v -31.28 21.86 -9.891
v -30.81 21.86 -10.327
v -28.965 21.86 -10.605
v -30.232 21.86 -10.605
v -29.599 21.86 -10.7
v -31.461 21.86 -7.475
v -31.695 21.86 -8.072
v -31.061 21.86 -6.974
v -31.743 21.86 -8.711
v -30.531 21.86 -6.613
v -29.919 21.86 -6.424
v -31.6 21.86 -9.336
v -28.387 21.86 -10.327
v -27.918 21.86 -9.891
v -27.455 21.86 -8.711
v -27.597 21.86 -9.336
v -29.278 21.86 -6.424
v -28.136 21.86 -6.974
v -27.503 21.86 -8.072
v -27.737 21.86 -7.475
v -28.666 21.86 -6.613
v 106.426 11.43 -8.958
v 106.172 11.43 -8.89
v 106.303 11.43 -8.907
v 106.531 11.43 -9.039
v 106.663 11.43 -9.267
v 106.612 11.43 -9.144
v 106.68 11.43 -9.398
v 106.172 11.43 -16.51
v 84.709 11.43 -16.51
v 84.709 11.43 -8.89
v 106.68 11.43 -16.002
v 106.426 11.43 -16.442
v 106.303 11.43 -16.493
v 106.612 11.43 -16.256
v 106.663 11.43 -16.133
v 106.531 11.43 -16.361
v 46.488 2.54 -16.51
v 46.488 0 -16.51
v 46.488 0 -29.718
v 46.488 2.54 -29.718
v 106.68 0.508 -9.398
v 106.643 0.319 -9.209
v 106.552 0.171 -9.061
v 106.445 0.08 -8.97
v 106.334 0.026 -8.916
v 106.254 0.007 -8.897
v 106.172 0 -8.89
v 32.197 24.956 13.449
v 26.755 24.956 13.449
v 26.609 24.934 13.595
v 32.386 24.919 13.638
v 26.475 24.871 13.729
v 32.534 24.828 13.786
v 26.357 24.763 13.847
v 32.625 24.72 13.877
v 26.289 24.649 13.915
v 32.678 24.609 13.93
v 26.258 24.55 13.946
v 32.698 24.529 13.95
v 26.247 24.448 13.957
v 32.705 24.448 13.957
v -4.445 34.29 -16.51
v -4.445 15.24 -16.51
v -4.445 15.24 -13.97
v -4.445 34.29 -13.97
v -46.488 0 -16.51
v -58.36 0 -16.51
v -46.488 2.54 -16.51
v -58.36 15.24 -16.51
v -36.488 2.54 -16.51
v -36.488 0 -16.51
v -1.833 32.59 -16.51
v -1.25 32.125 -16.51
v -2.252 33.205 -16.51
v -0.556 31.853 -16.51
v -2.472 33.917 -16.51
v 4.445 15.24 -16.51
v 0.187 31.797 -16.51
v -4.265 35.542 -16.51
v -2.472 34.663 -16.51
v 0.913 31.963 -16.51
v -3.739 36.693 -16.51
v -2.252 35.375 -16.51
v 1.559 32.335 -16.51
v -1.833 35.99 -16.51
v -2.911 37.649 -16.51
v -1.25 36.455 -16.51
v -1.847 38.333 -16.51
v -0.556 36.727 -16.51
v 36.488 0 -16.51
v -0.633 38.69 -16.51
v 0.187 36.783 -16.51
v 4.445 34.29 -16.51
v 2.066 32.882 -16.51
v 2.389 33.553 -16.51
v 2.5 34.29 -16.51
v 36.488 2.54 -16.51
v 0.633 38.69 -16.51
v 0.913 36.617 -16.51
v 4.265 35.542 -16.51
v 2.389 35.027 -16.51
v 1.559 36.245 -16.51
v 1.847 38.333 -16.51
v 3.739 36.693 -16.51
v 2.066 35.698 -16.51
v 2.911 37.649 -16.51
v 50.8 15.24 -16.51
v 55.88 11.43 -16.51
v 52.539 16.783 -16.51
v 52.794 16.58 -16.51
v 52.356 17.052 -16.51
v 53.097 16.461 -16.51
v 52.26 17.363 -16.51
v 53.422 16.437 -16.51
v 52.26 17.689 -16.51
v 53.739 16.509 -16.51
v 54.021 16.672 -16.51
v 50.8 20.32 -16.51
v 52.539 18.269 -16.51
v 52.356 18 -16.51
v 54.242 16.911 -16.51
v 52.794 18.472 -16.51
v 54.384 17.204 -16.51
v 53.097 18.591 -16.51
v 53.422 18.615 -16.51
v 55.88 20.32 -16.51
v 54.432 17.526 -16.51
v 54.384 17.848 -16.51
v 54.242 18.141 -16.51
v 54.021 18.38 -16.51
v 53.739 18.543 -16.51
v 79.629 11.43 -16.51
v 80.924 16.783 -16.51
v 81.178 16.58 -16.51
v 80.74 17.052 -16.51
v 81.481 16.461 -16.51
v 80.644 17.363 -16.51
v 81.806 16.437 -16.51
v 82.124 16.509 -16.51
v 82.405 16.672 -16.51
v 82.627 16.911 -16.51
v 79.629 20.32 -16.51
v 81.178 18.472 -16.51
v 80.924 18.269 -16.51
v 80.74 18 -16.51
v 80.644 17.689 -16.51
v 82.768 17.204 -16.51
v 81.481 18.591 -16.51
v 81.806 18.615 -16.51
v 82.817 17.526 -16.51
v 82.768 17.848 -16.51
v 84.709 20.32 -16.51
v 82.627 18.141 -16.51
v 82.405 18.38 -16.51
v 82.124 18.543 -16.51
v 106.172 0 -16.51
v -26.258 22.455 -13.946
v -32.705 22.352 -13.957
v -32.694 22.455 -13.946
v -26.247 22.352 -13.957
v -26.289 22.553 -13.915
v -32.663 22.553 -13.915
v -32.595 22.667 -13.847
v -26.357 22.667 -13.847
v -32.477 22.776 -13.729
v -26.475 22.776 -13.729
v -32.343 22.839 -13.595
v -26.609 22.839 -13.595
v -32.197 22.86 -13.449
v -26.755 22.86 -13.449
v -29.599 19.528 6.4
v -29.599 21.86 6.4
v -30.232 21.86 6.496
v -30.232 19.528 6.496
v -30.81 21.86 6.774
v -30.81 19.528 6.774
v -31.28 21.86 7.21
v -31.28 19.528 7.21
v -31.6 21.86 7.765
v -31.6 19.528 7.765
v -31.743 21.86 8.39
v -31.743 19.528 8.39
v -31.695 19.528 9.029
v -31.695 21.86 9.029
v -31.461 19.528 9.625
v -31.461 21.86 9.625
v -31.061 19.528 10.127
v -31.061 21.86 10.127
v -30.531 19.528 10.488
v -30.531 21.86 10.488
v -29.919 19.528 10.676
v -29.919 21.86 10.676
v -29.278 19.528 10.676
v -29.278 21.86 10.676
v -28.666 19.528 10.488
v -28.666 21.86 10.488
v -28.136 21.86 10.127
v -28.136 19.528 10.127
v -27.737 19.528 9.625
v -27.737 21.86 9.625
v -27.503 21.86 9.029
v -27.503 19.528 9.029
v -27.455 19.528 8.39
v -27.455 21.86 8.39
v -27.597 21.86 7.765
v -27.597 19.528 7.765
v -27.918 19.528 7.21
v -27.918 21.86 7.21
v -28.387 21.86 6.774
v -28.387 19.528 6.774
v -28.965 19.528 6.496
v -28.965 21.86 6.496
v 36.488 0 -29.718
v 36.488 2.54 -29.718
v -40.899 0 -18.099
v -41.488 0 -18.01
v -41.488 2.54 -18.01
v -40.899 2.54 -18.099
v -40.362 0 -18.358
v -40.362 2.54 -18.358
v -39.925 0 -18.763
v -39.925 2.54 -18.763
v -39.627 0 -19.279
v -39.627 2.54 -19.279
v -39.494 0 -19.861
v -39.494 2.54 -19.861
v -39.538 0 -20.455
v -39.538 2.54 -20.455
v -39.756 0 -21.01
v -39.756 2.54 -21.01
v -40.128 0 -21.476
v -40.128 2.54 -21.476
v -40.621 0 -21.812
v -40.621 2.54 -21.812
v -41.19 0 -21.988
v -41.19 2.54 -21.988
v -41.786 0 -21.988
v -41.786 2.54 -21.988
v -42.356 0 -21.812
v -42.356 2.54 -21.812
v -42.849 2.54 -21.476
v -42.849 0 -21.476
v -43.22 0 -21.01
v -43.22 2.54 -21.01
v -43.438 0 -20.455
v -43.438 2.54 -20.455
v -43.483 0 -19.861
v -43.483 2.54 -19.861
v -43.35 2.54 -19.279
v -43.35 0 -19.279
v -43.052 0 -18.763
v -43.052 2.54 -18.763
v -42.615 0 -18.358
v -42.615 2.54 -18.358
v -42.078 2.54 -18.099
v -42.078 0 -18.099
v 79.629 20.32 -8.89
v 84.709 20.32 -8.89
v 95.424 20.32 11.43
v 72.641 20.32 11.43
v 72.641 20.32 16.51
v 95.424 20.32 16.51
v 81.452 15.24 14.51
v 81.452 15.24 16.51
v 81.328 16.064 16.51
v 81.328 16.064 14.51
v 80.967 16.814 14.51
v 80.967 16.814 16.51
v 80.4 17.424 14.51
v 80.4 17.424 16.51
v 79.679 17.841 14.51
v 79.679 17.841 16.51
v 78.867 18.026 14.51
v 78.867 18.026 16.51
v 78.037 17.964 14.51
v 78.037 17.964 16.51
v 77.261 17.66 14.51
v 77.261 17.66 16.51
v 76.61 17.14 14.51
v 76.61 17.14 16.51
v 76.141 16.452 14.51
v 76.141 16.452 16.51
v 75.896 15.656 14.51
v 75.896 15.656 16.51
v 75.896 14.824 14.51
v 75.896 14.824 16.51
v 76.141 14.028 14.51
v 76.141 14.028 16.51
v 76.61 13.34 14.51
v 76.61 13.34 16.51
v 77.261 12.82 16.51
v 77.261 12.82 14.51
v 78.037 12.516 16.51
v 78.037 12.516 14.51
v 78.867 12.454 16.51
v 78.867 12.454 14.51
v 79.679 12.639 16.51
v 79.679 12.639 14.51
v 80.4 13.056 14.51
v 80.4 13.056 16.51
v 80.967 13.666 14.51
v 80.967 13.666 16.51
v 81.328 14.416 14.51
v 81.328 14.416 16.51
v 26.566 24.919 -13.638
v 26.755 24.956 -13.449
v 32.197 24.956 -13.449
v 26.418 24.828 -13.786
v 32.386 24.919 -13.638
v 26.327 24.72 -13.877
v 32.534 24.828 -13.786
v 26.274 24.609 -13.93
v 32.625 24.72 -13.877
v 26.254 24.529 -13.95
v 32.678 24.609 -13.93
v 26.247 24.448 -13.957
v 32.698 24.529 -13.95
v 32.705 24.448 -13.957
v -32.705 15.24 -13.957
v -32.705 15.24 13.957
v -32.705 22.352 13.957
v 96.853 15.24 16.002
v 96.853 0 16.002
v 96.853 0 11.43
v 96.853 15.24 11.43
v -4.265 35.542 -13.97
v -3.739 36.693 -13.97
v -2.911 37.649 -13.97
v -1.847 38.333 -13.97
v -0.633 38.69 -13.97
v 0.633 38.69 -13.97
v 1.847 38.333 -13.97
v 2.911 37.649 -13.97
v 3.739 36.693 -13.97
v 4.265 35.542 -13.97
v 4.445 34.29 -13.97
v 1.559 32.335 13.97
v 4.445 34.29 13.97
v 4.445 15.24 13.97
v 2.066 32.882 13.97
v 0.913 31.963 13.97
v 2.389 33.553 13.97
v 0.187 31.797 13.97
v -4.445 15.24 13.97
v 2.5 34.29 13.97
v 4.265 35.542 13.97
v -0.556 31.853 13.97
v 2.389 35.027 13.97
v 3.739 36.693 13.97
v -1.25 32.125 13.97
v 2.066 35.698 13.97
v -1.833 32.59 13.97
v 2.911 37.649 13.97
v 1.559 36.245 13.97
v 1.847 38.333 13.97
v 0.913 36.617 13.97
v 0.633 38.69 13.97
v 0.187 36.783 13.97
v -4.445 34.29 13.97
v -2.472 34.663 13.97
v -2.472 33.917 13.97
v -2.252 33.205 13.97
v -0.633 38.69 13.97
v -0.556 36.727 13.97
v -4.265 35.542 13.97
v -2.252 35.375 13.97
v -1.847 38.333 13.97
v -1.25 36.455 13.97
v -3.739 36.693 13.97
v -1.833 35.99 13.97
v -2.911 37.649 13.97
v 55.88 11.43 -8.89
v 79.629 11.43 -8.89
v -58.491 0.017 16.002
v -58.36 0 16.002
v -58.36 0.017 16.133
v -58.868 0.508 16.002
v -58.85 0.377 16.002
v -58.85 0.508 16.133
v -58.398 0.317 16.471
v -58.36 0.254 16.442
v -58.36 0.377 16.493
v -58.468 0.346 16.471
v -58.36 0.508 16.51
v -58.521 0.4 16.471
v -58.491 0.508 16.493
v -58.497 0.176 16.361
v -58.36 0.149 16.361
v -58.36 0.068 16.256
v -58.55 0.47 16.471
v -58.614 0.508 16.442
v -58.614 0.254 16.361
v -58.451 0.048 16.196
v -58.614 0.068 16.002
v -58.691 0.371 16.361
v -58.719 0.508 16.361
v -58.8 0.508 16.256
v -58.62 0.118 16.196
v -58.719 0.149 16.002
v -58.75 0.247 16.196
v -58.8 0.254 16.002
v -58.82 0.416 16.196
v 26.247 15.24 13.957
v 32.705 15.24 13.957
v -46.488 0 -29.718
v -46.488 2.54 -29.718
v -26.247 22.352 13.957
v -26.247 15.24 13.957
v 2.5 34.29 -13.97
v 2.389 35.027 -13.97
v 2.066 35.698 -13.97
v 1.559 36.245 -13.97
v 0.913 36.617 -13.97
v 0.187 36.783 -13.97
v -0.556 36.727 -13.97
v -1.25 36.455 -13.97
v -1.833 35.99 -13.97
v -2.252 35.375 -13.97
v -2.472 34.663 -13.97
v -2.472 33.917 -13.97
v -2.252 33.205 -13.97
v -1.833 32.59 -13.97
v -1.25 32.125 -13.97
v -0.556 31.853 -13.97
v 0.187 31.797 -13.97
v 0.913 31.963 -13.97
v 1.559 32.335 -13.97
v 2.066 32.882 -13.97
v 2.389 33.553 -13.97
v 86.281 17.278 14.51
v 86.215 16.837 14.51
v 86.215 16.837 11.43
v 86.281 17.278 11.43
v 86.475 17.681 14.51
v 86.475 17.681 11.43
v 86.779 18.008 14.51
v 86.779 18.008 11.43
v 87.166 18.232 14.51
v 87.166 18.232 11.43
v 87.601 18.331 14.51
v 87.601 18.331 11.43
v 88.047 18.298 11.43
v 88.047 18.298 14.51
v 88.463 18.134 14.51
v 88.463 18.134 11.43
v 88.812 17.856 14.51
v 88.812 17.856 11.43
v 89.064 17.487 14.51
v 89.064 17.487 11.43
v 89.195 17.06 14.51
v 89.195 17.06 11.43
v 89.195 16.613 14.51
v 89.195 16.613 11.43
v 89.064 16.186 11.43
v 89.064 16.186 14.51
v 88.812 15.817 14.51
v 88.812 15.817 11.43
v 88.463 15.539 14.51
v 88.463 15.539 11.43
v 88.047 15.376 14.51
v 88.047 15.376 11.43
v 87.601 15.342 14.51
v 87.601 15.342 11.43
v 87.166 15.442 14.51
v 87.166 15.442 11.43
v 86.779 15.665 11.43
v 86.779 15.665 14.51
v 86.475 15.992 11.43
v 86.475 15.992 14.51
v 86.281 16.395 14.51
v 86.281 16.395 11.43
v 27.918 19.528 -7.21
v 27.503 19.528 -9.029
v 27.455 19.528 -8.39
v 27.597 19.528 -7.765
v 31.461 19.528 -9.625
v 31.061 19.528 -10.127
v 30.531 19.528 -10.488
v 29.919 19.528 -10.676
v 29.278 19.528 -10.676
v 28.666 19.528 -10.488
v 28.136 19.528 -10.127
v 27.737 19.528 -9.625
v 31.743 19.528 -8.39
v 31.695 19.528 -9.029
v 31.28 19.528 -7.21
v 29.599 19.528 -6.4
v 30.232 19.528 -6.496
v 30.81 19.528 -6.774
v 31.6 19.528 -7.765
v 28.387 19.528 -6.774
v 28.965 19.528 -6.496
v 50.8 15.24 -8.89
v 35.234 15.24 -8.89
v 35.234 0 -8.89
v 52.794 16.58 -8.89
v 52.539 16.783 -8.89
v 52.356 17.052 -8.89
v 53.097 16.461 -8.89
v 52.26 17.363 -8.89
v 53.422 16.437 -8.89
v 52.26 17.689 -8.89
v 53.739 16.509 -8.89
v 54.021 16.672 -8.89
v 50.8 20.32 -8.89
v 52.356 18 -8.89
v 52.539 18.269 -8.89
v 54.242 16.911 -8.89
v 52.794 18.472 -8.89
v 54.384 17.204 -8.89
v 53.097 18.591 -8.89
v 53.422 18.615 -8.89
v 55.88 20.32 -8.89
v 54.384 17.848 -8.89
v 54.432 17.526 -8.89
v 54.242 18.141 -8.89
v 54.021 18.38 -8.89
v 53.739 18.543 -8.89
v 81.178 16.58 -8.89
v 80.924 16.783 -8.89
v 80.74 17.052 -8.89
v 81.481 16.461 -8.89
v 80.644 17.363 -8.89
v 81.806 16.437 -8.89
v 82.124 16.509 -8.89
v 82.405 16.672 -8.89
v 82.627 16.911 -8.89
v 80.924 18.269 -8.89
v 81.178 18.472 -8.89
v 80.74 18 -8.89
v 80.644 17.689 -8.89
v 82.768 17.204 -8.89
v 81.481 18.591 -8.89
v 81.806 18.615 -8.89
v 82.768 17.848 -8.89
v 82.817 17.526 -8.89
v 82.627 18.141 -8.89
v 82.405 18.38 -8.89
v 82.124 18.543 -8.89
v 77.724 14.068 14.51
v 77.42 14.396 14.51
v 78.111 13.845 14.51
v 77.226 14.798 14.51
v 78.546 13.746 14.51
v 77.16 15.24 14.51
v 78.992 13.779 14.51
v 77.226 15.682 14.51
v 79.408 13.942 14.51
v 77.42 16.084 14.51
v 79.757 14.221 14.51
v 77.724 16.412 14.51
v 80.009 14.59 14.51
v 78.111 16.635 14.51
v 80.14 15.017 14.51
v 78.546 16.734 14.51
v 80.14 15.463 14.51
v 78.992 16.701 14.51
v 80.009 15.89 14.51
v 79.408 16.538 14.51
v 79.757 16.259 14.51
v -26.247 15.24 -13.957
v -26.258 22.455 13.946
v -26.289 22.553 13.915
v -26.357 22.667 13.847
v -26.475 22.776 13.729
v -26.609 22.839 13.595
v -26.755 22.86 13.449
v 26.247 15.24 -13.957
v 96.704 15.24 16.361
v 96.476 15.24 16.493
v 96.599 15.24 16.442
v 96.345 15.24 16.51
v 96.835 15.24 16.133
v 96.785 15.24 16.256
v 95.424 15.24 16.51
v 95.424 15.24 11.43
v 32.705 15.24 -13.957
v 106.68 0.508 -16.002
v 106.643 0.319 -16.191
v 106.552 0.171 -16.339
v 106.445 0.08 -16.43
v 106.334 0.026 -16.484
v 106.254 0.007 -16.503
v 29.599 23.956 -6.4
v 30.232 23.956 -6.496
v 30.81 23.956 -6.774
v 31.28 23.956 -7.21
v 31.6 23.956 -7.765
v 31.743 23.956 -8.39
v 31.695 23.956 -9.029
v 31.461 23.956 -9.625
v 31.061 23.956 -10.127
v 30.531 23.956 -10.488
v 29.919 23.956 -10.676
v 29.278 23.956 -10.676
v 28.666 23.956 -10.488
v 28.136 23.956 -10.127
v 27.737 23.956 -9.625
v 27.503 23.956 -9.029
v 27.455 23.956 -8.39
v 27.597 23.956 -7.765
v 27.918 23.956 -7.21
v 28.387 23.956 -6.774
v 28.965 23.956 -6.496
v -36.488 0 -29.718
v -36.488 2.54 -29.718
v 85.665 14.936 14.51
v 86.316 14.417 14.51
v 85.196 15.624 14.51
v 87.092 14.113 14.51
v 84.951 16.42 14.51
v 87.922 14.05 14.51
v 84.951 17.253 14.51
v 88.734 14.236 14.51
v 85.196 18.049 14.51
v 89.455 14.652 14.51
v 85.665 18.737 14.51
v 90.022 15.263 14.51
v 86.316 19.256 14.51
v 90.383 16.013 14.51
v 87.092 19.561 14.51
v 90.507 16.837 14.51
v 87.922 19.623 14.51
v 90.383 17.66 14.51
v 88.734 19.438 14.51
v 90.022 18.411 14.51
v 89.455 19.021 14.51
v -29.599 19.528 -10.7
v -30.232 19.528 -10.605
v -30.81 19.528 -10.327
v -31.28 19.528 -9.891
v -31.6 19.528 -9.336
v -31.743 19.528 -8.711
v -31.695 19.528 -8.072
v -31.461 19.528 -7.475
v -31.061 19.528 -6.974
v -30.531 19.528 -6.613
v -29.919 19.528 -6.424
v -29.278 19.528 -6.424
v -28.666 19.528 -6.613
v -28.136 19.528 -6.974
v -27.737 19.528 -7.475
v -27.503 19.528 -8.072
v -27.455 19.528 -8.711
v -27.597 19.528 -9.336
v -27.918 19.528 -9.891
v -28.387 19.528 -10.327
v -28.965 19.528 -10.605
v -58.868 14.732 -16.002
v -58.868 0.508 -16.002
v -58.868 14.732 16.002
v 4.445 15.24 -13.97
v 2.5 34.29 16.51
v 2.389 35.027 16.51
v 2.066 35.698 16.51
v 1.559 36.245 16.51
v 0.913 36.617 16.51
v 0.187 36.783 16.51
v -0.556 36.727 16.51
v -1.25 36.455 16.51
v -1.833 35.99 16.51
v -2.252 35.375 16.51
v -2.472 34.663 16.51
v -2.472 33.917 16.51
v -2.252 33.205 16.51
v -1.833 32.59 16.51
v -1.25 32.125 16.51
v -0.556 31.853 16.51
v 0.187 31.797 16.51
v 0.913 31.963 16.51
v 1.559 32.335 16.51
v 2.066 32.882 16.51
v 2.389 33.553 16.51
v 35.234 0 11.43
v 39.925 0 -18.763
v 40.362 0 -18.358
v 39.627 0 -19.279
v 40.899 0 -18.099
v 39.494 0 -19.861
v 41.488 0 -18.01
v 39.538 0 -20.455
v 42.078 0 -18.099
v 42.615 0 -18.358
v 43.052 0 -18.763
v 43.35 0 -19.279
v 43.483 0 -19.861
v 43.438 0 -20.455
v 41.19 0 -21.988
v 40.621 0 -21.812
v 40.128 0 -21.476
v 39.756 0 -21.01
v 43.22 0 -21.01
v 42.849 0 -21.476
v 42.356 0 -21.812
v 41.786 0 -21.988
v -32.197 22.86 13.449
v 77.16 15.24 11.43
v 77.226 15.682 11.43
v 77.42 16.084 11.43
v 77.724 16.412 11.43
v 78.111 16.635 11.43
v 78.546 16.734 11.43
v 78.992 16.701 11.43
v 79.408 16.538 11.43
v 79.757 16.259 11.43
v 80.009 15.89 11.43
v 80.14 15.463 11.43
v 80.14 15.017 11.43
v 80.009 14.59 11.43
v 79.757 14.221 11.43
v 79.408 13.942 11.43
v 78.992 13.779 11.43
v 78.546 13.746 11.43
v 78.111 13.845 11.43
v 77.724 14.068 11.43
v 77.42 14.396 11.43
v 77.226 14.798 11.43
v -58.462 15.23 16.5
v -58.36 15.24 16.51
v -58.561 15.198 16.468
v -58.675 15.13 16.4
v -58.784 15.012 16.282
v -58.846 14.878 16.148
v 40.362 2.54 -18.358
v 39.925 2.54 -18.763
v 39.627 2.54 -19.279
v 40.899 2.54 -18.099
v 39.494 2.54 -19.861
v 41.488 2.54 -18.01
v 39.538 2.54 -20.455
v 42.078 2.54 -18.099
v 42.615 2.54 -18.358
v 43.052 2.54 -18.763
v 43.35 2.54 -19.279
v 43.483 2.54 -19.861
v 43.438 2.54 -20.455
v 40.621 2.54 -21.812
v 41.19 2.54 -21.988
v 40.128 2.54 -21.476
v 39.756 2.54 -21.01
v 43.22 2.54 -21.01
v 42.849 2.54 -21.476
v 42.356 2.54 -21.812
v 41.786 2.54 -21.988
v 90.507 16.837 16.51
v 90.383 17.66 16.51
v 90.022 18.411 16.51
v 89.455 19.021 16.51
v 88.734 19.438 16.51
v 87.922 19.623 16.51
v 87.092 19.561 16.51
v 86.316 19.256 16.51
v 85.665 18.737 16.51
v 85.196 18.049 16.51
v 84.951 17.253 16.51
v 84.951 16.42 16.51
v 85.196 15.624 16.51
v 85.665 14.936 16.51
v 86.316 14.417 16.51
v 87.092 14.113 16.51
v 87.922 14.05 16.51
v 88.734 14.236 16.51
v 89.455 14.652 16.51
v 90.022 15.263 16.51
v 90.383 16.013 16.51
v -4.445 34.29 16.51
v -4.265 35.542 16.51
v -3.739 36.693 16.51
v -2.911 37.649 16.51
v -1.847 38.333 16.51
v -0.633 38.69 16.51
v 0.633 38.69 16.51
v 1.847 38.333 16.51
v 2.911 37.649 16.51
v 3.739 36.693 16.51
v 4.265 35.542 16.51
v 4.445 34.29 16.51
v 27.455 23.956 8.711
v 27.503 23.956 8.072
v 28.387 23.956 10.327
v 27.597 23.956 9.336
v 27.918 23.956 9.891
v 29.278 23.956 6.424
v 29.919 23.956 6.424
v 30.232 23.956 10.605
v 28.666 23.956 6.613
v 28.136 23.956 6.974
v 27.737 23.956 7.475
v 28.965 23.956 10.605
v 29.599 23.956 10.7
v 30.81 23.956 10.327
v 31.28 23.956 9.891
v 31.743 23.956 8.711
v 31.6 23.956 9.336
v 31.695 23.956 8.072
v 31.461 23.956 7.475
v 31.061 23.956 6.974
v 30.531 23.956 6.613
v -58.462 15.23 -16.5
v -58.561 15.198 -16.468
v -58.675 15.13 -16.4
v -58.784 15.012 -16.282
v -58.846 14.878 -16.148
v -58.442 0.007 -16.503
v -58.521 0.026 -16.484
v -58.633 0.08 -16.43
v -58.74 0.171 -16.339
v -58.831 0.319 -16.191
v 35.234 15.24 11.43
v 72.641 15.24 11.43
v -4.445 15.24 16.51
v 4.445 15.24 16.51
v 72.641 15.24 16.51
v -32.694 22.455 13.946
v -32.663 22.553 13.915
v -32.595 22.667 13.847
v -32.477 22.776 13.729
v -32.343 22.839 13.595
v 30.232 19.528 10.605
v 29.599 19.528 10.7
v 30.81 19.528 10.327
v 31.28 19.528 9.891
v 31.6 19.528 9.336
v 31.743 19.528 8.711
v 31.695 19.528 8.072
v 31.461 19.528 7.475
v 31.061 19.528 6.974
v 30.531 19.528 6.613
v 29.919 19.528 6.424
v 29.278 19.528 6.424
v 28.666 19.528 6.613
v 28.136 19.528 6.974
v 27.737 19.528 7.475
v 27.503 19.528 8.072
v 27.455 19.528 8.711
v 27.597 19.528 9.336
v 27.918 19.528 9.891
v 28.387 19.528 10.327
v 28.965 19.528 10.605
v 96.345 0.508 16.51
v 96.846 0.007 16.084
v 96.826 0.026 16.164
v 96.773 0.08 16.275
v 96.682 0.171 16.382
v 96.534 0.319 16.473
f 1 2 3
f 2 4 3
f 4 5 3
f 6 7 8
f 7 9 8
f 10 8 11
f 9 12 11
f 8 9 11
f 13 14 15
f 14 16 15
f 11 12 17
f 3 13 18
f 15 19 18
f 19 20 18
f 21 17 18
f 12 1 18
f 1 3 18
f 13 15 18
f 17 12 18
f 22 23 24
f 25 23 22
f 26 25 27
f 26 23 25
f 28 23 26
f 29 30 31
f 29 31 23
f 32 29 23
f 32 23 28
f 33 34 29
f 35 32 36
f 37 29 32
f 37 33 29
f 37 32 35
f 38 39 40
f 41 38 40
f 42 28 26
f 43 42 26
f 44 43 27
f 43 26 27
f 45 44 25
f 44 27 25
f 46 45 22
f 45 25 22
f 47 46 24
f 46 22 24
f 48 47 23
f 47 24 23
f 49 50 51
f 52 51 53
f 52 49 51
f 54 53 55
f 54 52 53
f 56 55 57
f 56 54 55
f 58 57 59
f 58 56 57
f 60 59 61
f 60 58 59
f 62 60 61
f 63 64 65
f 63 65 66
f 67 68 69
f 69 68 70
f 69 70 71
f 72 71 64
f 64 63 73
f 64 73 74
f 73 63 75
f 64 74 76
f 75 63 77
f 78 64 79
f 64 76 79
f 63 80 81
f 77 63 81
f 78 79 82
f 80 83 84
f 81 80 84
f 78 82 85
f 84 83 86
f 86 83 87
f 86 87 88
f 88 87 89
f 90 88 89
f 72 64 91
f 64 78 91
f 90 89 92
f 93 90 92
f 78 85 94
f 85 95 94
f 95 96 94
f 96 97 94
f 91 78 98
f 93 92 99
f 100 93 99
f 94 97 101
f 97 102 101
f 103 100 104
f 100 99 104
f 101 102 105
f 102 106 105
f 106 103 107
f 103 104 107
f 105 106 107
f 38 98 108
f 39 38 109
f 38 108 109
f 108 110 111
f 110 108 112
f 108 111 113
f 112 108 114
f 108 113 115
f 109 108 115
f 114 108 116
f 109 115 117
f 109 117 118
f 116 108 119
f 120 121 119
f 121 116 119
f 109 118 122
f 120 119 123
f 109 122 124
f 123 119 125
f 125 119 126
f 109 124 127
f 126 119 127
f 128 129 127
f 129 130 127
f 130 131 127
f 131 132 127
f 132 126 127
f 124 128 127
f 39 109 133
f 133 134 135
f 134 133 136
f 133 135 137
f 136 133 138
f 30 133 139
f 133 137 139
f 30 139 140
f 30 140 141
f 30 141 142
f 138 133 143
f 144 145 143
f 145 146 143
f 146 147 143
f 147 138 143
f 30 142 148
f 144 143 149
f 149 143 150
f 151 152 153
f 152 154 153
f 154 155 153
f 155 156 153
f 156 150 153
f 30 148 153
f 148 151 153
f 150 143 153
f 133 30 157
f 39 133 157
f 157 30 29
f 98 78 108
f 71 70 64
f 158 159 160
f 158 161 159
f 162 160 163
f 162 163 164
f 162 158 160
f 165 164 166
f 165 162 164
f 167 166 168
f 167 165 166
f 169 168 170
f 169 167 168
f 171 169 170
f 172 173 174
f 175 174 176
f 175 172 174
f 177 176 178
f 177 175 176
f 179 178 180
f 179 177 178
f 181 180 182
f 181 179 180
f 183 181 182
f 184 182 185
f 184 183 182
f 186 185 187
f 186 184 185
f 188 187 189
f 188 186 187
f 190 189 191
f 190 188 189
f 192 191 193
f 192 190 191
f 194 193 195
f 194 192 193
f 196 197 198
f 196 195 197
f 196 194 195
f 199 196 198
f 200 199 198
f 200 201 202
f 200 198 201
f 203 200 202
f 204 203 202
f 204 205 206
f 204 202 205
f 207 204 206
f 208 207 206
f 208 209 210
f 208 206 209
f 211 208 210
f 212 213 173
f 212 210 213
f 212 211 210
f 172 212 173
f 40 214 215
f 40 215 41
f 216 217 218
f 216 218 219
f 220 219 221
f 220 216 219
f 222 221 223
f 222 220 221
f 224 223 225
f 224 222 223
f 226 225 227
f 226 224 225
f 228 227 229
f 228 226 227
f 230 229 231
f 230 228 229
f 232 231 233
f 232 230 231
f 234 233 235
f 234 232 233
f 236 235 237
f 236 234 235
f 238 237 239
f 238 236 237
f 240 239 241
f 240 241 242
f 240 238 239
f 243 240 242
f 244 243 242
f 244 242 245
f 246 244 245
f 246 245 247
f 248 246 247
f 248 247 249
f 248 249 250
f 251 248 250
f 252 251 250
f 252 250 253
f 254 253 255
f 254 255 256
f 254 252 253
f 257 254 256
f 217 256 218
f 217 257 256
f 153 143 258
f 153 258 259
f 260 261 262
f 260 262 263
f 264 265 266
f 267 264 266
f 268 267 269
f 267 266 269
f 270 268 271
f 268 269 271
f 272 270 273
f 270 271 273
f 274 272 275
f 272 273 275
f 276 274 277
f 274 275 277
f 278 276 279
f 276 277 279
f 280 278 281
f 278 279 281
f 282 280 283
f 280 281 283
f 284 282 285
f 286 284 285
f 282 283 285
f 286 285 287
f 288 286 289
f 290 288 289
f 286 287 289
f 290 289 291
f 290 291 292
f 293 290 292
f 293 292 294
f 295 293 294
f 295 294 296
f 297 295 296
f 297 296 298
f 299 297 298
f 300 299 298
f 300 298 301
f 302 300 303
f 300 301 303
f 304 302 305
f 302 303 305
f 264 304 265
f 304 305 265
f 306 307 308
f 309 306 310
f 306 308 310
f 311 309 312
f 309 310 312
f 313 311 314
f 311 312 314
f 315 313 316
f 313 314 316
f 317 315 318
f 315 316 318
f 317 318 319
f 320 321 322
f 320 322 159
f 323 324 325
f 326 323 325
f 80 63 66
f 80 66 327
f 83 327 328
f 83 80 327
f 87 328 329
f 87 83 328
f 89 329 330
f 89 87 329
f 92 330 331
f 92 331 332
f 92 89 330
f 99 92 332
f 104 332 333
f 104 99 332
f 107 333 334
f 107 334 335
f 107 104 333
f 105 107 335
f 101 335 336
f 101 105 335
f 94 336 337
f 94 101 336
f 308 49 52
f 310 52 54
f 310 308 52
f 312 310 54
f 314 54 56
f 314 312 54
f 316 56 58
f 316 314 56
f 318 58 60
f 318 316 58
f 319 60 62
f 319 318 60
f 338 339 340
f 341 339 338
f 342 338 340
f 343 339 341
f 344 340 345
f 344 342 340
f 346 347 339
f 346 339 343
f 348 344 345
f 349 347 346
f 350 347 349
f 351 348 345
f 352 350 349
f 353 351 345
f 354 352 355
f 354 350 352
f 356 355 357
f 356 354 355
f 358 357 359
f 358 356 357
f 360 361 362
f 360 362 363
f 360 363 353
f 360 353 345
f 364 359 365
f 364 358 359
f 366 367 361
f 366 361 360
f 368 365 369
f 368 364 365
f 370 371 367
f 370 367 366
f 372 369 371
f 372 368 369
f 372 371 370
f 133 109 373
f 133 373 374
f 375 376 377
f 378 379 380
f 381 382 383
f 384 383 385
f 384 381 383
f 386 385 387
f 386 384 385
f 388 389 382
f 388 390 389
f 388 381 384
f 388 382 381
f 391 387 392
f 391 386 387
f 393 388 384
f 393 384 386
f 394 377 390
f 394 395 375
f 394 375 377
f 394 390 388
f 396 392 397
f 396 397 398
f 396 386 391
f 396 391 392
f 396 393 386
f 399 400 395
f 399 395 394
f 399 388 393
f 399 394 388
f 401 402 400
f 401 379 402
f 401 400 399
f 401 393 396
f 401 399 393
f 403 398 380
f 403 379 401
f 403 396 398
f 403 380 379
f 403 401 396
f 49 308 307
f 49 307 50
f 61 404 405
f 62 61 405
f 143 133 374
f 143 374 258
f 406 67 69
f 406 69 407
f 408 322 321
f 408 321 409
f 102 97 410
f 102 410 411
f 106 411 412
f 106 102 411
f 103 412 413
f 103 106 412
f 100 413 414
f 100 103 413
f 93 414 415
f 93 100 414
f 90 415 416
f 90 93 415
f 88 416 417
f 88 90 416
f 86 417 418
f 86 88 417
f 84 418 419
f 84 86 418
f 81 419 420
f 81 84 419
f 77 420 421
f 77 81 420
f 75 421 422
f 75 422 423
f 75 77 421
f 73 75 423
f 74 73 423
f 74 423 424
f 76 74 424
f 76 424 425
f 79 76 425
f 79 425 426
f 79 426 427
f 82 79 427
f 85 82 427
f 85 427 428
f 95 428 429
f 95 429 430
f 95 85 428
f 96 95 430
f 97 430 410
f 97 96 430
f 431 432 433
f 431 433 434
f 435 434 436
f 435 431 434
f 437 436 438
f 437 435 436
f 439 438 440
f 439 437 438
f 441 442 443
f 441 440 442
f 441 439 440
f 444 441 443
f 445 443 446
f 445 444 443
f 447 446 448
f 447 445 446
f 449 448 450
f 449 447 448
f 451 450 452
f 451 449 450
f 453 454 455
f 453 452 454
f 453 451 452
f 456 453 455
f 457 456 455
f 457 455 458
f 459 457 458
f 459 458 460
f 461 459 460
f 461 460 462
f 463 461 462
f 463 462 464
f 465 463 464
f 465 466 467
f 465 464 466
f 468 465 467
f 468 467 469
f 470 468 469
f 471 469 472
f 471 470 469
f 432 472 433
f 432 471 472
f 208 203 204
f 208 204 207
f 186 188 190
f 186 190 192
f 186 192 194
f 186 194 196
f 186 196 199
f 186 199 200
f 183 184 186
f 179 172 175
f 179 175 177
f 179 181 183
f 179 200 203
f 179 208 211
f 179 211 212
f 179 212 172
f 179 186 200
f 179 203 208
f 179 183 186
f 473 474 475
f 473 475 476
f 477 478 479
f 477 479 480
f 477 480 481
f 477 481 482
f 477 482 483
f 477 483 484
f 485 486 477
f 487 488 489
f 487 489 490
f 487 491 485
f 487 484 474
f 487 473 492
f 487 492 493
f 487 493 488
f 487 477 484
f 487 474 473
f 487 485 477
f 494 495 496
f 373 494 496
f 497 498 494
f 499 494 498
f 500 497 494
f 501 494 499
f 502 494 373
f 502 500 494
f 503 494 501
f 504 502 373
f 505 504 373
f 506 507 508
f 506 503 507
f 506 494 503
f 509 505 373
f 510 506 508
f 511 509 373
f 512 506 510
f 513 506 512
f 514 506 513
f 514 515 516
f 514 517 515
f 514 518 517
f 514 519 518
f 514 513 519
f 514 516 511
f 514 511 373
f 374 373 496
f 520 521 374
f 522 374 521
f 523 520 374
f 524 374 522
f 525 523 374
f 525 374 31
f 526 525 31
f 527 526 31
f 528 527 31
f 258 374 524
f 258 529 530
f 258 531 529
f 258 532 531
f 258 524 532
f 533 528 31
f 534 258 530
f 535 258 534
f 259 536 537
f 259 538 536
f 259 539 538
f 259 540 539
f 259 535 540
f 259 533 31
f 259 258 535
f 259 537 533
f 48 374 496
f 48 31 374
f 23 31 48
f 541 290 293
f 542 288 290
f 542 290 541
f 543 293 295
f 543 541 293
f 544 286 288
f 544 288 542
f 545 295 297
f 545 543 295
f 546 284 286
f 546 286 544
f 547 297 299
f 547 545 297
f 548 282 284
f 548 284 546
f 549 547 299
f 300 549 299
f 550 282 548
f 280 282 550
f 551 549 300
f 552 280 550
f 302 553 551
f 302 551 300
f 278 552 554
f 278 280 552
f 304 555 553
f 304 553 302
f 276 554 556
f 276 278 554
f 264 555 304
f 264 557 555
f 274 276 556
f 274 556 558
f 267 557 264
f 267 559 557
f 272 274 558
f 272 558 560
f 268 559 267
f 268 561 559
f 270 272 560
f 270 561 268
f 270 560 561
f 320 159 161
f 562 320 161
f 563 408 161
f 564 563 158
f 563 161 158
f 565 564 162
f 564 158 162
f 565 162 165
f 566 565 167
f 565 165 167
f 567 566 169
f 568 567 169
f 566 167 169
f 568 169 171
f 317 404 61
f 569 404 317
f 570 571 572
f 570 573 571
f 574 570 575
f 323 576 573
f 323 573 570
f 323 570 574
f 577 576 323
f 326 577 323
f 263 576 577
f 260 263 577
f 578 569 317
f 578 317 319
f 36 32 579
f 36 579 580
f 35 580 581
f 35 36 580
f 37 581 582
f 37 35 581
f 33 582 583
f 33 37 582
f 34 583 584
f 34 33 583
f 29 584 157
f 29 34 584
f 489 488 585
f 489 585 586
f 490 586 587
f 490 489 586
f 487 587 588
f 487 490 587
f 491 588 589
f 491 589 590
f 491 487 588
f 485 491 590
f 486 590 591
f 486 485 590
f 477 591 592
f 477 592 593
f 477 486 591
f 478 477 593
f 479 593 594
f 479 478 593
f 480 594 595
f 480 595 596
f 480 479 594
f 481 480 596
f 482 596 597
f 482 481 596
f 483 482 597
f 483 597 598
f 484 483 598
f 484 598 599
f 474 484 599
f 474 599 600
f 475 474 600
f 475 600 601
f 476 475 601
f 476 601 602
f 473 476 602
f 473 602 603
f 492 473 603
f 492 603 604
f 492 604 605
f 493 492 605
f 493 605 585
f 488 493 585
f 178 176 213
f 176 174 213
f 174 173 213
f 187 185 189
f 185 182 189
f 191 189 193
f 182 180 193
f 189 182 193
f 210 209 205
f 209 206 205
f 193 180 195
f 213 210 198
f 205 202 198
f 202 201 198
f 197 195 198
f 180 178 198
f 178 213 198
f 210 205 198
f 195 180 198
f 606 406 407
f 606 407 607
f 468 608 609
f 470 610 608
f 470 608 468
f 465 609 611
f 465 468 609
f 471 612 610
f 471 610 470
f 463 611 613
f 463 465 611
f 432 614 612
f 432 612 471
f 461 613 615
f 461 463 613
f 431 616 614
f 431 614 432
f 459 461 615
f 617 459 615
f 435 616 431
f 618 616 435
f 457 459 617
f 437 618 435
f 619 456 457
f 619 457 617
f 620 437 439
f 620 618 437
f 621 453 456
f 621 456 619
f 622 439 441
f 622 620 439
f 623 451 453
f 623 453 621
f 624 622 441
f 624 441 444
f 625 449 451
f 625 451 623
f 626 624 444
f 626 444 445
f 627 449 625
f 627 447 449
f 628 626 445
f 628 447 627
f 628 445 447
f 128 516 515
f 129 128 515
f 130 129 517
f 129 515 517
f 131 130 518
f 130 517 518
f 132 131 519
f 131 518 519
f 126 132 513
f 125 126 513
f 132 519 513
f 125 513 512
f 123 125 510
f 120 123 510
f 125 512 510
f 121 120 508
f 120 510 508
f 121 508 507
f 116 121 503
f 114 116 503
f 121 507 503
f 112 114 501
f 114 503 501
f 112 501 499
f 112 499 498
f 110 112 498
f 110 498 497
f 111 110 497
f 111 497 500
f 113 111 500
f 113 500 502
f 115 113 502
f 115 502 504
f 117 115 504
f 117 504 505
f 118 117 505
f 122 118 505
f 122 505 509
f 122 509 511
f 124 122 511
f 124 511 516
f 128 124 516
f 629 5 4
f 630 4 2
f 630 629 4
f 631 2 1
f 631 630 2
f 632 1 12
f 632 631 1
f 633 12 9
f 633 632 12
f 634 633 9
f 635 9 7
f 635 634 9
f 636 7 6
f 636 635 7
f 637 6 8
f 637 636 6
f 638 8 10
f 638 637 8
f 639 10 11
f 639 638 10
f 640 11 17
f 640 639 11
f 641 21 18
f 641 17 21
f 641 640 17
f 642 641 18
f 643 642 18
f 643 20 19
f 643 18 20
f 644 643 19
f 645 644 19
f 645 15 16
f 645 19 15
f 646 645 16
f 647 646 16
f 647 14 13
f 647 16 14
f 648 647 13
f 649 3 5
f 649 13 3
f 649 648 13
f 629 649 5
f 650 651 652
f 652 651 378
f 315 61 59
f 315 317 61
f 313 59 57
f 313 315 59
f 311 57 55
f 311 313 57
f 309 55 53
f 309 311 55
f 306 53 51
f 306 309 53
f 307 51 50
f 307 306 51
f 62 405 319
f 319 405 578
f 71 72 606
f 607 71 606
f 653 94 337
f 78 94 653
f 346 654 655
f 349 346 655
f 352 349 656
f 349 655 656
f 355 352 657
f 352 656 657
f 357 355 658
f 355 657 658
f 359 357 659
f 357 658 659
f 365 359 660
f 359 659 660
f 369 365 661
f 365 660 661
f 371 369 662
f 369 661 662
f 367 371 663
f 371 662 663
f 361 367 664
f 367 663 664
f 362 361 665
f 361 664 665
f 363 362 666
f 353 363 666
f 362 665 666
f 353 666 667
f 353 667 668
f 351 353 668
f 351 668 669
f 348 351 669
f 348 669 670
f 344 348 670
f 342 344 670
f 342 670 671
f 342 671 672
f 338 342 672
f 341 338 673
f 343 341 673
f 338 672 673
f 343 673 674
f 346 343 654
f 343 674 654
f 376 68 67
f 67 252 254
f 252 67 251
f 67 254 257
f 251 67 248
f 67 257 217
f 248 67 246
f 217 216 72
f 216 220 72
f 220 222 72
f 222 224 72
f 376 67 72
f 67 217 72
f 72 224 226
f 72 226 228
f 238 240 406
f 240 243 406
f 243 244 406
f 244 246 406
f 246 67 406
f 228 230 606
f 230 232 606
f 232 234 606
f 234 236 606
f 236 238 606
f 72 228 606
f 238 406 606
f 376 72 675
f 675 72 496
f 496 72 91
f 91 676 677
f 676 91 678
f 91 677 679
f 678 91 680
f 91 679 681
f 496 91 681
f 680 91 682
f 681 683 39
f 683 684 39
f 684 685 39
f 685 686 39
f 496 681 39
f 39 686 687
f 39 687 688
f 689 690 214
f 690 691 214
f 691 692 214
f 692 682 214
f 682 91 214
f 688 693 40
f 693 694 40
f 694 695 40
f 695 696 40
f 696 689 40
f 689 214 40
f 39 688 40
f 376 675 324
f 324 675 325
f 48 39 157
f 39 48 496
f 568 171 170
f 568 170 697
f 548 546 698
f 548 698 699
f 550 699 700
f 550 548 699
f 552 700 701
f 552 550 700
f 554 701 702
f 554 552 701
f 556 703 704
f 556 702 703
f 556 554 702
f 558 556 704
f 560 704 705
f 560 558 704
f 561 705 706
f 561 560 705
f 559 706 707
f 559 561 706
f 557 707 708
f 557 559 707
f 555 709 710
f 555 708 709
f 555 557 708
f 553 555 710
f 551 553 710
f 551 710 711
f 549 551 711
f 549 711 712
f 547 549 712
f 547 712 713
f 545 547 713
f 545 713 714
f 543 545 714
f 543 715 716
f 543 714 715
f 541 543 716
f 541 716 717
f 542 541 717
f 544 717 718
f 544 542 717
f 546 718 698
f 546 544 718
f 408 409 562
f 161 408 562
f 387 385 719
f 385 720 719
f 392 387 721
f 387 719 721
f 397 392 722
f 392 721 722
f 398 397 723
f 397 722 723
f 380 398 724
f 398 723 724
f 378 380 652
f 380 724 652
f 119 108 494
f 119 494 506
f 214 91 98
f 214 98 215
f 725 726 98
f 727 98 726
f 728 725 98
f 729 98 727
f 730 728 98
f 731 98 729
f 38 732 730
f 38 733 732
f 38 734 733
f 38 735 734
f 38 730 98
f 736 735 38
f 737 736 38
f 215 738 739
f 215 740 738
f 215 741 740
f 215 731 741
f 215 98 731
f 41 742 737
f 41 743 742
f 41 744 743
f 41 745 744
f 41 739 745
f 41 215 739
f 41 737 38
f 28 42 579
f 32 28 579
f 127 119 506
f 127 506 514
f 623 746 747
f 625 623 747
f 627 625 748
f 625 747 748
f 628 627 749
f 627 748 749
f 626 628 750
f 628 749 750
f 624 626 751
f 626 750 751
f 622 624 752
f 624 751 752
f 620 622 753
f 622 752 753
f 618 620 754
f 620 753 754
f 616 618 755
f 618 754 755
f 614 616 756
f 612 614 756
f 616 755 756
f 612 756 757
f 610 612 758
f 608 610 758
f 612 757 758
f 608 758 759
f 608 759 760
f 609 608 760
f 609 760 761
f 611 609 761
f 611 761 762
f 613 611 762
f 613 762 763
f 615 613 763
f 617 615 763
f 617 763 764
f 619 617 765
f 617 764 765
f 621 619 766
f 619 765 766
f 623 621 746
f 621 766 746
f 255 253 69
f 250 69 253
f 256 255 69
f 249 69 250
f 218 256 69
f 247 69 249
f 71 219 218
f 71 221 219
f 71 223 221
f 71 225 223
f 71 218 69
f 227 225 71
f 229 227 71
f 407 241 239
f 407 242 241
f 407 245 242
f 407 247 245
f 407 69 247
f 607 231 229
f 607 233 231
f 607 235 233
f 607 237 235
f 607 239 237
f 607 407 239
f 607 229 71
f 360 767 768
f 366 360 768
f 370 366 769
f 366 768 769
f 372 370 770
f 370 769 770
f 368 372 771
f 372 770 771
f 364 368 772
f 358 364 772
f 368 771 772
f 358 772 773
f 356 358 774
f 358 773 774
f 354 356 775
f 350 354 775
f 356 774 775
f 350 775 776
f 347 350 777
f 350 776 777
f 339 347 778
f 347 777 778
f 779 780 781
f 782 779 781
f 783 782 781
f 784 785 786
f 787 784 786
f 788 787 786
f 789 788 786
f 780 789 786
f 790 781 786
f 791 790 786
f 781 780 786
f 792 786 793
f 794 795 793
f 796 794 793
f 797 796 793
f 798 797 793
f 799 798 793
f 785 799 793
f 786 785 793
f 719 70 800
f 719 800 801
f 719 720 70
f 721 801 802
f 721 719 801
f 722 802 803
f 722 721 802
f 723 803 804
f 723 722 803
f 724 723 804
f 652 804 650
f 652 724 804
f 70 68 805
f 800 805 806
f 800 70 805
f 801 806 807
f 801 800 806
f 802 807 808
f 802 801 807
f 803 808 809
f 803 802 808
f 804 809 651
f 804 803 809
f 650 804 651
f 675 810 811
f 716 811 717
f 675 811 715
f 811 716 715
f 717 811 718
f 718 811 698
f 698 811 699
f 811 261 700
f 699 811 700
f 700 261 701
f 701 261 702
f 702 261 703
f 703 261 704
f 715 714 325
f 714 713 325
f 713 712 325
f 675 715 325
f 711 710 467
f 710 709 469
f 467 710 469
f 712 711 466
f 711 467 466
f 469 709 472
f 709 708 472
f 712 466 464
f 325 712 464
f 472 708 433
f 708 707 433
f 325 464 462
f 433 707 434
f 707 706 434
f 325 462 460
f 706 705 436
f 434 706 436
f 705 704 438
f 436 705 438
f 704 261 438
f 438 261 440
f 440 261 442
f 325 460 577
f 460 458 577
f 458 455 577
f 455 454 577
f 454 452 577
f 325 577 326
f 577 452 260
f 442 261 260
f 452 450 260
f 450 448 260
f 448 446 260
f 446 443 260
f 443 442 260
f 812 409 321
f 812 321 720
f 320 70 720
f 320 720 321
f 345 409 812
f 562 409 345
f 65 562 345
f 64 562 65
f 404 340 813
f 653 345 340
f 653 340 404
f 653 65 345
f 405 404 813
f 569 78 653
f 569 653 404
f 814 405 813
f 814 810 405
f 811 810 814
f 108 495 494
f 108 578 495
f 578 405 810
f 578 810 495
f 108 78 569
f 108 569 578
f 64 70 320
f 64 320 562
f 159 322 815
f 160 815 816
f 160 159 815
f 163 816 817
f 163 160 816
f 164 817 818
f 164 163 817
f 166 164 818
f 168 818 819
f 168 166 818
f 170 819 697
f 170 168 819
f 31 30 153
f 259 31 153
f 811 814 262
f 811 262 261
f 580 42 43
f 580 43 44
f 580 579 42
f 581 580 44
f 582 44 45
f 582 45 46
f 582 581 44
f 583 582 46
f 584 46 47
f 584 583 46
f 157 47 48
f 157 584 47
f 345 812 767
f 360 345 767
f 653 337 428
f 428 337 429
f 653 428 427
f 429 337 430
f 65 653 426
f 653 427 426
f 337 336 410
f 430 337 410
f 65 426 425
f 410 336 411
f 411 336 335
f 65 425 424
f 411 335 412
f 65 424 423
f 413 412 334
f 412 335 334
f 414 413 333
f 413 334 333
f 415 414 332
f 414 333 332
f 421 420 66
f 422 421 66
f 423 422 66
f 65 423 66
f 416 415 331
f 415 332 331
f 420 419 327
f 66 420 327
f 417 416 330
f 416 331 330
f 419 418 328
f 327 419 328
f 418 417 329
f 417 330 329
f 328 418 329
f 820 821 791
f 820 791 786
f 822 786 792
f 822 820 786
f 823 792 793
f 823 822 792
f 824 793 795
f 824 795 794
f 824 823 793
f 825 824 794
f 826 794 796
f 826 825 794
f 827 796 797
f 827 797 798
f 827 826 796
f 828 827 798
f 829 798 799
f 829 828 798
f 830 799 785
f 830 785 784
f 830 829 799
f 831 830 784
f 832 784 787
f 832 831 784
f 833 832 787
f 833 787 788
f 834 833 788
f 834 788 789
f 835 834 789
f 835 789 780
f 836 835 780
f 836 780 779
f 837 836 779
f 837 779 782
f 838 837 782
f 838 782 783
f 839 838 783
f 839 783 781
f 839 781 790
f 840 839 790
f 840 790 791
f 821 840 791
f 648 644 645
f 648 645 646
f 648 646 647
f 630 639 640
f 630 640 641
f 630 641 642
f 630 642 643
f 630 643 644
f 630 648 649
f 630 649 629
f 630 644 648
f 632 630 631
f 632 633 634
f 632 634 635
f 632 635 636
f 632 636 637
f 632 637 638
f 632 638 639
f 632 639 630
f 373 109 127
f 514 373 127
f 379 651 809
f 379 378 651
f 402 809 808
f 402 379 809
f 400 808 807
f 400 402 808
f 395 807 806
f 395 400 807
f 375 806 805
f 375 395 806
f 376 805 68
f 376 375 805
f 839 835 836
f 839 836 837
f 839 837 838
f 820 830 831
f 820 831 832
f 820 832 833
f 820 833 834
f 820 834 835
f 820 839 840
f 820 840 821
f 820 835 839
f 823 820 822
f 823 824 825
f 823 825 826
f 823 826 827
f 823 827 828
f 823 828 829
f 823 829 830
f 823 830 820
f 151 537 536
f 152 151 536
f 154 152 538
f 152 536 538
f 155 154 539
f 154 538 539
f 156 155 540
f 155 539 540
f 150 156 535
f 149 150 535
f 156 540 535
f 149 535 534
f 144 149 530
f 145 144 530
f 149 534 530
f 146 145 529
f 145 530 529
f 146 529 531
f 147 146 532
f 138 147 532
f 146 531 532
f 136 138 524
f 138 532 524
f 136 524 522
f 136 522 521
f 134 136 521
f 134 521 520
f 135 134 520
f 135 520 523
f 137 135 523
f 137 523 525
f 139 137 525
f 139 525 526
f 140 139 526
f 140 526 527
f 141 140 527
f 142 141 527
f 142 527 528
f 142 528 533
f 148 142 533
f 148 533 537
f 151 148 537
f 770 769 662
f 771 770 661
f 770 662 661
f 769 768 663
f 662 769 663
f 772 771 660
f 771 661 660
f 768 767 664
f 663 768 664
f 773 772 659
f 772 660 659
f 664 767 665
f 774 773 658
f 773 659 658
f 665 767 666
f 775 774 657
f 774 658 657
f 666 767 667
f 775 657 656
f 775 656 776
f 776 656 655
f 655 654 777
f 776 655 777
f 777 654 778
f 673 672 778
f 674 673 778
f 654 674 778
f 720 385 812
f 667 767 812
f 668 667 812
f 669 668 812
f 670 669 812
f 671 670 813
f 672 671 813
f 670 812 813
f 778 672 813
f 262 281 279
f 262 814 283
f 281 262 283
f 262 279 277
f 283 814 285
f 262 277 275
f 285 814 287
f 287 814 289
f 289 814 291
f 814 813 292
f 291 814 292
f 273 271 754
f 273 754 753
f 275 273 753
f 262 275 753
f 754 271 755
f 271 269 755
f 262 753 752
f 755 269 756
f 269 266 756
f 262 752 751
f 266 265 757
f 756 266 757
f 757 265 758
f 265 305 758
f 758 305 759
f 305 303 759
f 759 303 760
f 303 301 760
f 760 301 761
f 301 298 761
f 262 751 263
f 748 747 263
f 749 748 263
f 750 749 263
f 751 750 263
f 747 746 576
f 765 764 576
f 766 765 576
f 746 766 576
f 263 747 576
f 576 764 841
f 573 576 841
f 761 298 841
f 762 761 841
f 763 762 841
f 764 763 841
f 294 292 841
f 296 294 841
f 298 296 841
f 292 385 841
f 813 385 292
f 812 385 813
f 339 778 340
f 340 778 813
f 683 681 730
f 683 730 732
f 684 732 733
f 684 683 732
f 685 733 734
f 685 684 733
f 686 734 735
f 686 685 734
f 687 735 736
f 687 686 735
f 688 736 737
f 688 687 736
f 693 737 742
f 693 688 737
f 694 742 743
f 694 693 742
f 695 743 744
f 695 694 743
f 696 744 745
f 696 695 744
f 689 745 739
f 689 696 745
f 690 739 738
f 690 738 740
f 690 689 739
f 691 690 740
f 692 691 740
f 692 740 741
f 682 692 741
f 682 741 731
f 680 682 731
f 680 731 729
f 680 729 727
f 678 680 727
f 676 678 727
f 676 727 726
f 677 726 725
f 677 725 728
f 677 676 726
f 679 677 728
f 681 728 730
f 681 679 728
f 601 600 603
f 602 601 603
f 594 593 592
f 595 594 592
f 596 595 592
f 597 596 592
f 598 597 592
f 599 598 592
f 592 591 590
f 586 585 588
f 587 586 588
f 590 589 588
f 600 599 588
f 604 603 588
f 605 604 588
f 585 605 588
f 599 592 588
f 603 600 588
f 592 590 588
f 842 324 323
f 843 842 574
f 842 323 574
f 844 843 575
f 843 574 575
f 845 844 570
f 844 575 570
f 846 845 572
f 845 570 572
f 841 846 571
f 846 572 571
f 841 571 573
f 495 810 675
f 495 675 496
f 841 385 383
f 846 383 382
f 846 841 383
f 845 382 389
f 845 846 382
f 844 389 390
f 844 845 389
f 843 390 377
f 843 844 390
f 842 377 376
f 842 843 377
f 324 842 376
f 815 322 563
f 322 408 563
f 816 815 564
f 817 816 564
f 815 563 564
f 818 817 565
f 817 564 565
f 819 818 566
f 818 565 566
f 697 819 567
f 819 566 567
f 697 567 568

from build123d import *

# Parameters (mm, degrees)
BOSS_EXTRUDE1_DEPTH     = 15.24
SKETCH3_R               = 2.5
BOSS_EXTRUDE2_DEPTH     = 2.54
SKETCH4_W               = 6.457620629
SKETCH4_H               = 27.913585942
BOSS_EXTRUDE3_DEPTH     = 7.62
SKETCH11_W              = 6.457620629
SKETCH11_H              = 27.913585942
BOSS_EXTRUDE6_DEPTH     = 2.0955
CUT_EXTRUDE1_DEPTH      = 111.34392643
CUT_EXTRUDE1_DEPTH_BACK = 3.332
SKETCH6_R               = 2.15
FILLET1_R               = 0.508
SKETCH8_W               = 21.59
SKETCH8_H               = 20.32
CUT_EXTRUDE2_DEPTH      = 111.477226273
SKETCH1_3_W             = 10
SKETCH1_3_H             = 13.208
SKETCH1_3_R             = 2
BOSS_EXTRUDE5_DEPTH     = 2.54
CUT_EXTRUDE5_DEPTH      = 9.2075
CUT_EXTRUDE5_DEPTH_BACK = 117.302117887
SKETCH14_W              = 50.8
SKETCH14_H              = 3.81
BOSS_EXTRUDE7_START     = -7.62
SKETCH15_W              = 5.08
SKETCH15_H              = 5.08
SKETCH15_H_2            = 8.89
BOSS_EXTRUDE7_DEPTH     = 7.62
CUT_EXTRUDE6_REACH      = 118.302
SKETCH16_R              = 1.0922
SKETCH18_W              = 22.782868823
SKETCH18_H              = 5.08
BOSS_EXTRUDE8_DEPTH     = 5.08
CUT_EXTRUDE3_DEPTH      = 12.7
CUT_EXTRUDE3_DEPTH_BACK = 12.7
SKETCH9_R               = 1.4986
SKETCH10_R              = 2.794
CUT_EXTRUDE4_DEPTH      = 2
SKETCH20_R              = 2.15
BOSS_EXTRUDE9_DEPTH     = 1
BOSS_EXTRUDE10_START    = -1
SKETCH21_R              = 2.15
BOSS_EXTRUDE10_DEPTH    = 1


with BuildPart() as part:
    # Sketch1 → Boss-Extrude1 (new body)
    with BuildSketch(Plane(origin=(0, 0, 0), x_dir=(1, 0, 0), z_dir=(0, 1, 0))):
        Polygon((-58.867621619, 16.51), (-58.867621619, -16.51), (96.852680324, -16.51), (96.852680324, -11.43), (55.88, -11.43), (55.88, 8.89), (106.68, 8.89), (106.68, 16.51), align=None)
    extrude(amount=BOSS_EXTRUDE1_DEPTH)

    # Sketch3 → Boss-Extrude2 (add)
    with BuildSketch(Plane.XY.offset(16.51)):
        with BuildLine():
            Line((4.445, 15.24), (-4.445, 15.24))
            Line((-4.445, 15.24), (-4.445, 34.29))
            ThreePointArc((-4.445, 34.29), (0, 38.735), (4.445, 34.29))
            Line((4.445, 34.29), (4.445, 15.24))
        make_face()
        with Locations((0, 34.29)):
            Circle(SKETCH3_R, mode=Mode.SUBTRACT)
    boss_extrude2 = extrude(amount=-BOSS_EXTRUDE2_DEPTH)

    # Mirror1: Boss-Extrude2 across plane
    add(boss_extrude2.mirror(Plane.XY))

    # Sketch4 → Boss-Extrude3 (add)
    with BuildSketch(Plane(origin=(0, 15.24, 0), x_dir=(1, 0, 0), z_dir=(0, 1, 0))):
        with Locations((29.475913514, 0)):
            Rectangle(SKETCH4_W, SKETCH4_H)
        with Locations((-29.475913514, 0)):
            Rectangle(SKETCH4_W, SKETCH4_H)
    extrude(amount=BOSS_EXTRUDE3_DEPTH)

    # Sketch11 → Boss-Extrude6 (add)
    with BuildSketch(Plane(origin=(0, 22.86, 0), x_dir=(1, 0, 0), z_dir=(0, 1, 0))):
        with Locations((29.475913514, 0)):
            Rectangle(SKETCH11_W, SKETCH11_H)
    extrude(amount=BOSS_EXTRUDE6_DEPTH)

    # Sketch6 → Cut-Extrude1 (cut, two sides: drawn at the far end of the back side and taken through both)
    with BuildSketch(Plane(origin=(0, 22.86, 0), x_dir=(1, 0, 0), z_dir=(0, 1, 0)).offset(-CUT_EXTRUDE1_DEPTH_BACK)):
        with Locations(Location((29.5986053, 8.550450758, 0), (0, 0, 270))):
            Circle(SKETCH6_R)
        with Locations(Location((29.5986053, -8.550450758, 0), (0, 0, 270))):
            Circle(SKETCH6_R)
        with Locations(Location((-29.5986053, -8.550450758, 0), (0, 0, 90))):
            Circle(SKETCH6_R)
        with Locations(Location((-29.5986053, 8.550450758, 0), (0, 0, 90))):
            Circle(SKETCH6_R)
    extrude(amount=CUT_EXTRUDE1_DEPTH + CUT_EXTRUDE1_DEPTH_BACK, mode=Mode.SUBTRACT)

    # Fillet1
    fillet1_edges = [part.edges().sort_by_distance(p)[0] for p in [
        (-58.867621619, 0, 0),
        (106.68, 0, -12.7),
        (18.992529352, 0, 16.51),
        (-58.867621619, 7.62, 16.51),
        (-58.867621619, 7.62, -16.51),
        (106.68, 7.62, -16.51),
        (106.68, 7.62, -8.89),
        (96.852680324, 7.62, 16.51),
        (106.68, 15.24, -12.7),
        (-58.867621619, 15.24, 0),
        (-26.247103199, 22.86, 0),
        (-29.475913514, 22.86, -13.956792971),
        (-32.704723828, 22.86, 0),
        (-29.475913514, 22.86, 13.956792971),
        (32.704723828, 24.9555, 0),
        (29.475913514, 24.9555, -13.956792971),
        (26.247103199, 24.9555, 0),
        (29.475913514, 24.9555, 13.956792971),
    ]]
    fillet(fillet1_edges, radius=FILLET1_R)

    # Sketch8 → Cut-Extrude2 (cut, through all)
    with BuildSketch(Plane(origin=(0, 15.24, 0), x_dir=(1, 0, 0), z_dir=(0, 1, 0))):
        with Locations((46.028773367, -1.27)):
            Rectangle(SKETCH8_W, SKETCH8_H)
    extrude(amount=-CUT_EXTRUDE2_DEPTH, mode=Mode.SUBTRACT)

    # Sketch1<3> → Boss-Extrude5 (add)
    # profile 1 of 2: a face of its own
    with BuildSketch(Plane(origin=(0, 0, 0), x_dir=(1, 0, 0), z_dir=(0, 1, 0))):
        with Locations((-41.488351659, 23.114)):
            Rectangle(SKETCH1_3_W, SKETCH1_3_H)
        with Locations(Location((-41.488351659, 20.01, 0), (0, 0, 270))):
            Circle(SKETCH1_3_R, mode=Mode.SUBTRACT)
    # profile 2 of 2: a face of its own
    with BuildSketch(Plane(origin=(0, 0, 0), x_dir=(1, 0, 0), z_dir=(0, 1, 0))):
        with Locations((41.488351659, 23.114)):
            Rectangle(SKETCH1_3_W, SKETCH1_3_H)
        with Locations(Location((41.488351659, 20.01, 0), (0, 0, 270))):
            Circle(SKETCH1_3_R, mode=Mode.SUBTRACT)
    extrude(amount=BOSS_EXTRUDE5_DEPTH)

    # Sketch14 → Cut-Extrude5 (cut, two sides: drawn at the far end of the back side and taken through both)
    with BuildSketch(Plane.XY.offset(-8.89).offset(-CUT_EXTRUDE5_DEPTH_BACK)):
        with Locations((81.28, 13.335)):
            Rectangle(SKETCH14_W, SKETCH14_H)
    extrude(amount=CUT_EXTRUDE5_DEPTH + CUT_EXTRUDE5_DEPTH_BACK, mode=Mode.SUBTRACT)

    # Sketch15 → Boss-Extrude7 (add)
    with BuildSketch(Plane.XY.offset(-8.89).offset(BOSS_EXTRUDE7_START)):
        with Locations((53.34, 17.78)):
            Rectangle(SKETCH15_W, SKETCH15_H)
        with Locations((82.169, 15.875)):
            Rectangle(SKETCH15_W, SKETCH15_H_2)
    extrude(amount=BOSS_EXTRUDE7_DEPTH)

    # Sketch16 → Cut-Extrude6 (cut, up to next)
    with BuildSketch(Plane.XY.offset(-8.89), mode=Mode.PRIVATE) as cut_extrude6_sk1:
        with Locations((53.34, 17.526)):
            Circle(SKETCH16_R)
    cut_extrude6_tool1 = extrude(cut_extrude6_sk1.sketch, amount=-CUT_EXTRUDE6_REACH, mode=Mode.PRIVATE) & part.part
    # Sketch16 → Cut-Extrude6 (cut, up to next)
    with BuildSketch(Plane.XY.offset(-8.89), mode=Mode.PRIVATE) as cut_extrude6_sk2:
        with Locations((81.7245, 17.526)):
            Circle(SKETCH16_R)
    cut_extrude6_tool2 = extrude(cut_extrude6_sk2.sketch, amount=-CUT_EXTRUDE6_REACH, mode=Mode.PRIVATE) & part.part
    add(cut_extrude6_tool1.solids().sort_by_distance((53.34, 17.526, -8.89))[0], mode=Mode.SUBTRACT)
    add(cut_extrude6_tool2.solids().sort_by_distance((81.7245, 17.526, -8.89))[0], mode=Mode.SUBTRACT)

    # Sketch18 → Boss-Extrude8 (add)
    with BuildSketch(Plane(origin=(0, 15.24, 0), x_dir=(1, 0, 0), z_dir=(0, 1, 0))):
        with Locations((84.032315508, -13.97)):
            Rectangle(SKETCH18_W, SKETCH18_H)
    extrude(amount=BOSS_EXTRUDE8_DEPTH)

    # Sketch9 → Cut-Extrude3 (cut, two sides: drawn at the far end of the back side and taken through both)
    with BuildSketch(Plane(origin=(0, 0, 11.43), x_dir=(-1, 0, 0), z_dir=(0, 0, -1)).offset(-CUT_EXTRUDE3_DEPTH_BACK)):
        with Locations((-87.713434176, 16.836660264)):
            Circle(SKETCH9_R)
        with Locations((-78.658323849, 15.24)):
            Circle(SKETCH9_R)
    extrude(amount=CUT_EXTRUDE3_DEPTH + CUT_EXTRUDE3_DEPTH_BACK, mode=Mode.SUBTRACT)

    # Sketch10 → Cut-Extrude4 (cut)
    with BuildSketch(Plane.XY.offset(16.51)):
        with Locations((78.658323849, 15.24)):
            Circle(SKETCH10_R)
        with Locations((87.713434176, 16.836660264)):
            Circle(SKETCH10_R)
    extrude(amount=-CUT_EXTRUDE4_DEPTH, mode=Mode.SUBTRACT)

    # Sketch20 → Boss-Extrude9 (add)
    with BuildSketch(Plane(origin=(0, 22.86, 0), x_dir=(1, 0, 0), z_dir=(0, 1, 0))):
        with Locations(Location((-29.5986053, -8.550450758, 0), (0, 0, 270))):
            Circle(SKETCH20_R)
        with Locations(Location((-29.5986053, 8.550450758, 0), (0, 0, 270))):
            Circle(SKETCH20_R)
    extrude(amount=-BOSS_EXTRUDE9_DEPTH)

    # Sketch21 → Boss-Extrude10 (add)
    with BuildSketch(Plane(origin=(0, 24.9555, 0), x_dir=(1, 0, 0), z_dir=(0, 1, 0)).offset(BOSS_EXTRUDE10_START)):
        with Locations(Location((29.5986053, -8.550450758, 0), (0, 0, 270))):
            Circle(SKETCH21_R)
        with Locations(Location((29.5986053, 8.550450758, 0), (0, 0, 270))):
            Circle(SKETCH21_R)
    extrude(amount=BOSS_EXTRUDE10_DEPTH)


solid = part.part
